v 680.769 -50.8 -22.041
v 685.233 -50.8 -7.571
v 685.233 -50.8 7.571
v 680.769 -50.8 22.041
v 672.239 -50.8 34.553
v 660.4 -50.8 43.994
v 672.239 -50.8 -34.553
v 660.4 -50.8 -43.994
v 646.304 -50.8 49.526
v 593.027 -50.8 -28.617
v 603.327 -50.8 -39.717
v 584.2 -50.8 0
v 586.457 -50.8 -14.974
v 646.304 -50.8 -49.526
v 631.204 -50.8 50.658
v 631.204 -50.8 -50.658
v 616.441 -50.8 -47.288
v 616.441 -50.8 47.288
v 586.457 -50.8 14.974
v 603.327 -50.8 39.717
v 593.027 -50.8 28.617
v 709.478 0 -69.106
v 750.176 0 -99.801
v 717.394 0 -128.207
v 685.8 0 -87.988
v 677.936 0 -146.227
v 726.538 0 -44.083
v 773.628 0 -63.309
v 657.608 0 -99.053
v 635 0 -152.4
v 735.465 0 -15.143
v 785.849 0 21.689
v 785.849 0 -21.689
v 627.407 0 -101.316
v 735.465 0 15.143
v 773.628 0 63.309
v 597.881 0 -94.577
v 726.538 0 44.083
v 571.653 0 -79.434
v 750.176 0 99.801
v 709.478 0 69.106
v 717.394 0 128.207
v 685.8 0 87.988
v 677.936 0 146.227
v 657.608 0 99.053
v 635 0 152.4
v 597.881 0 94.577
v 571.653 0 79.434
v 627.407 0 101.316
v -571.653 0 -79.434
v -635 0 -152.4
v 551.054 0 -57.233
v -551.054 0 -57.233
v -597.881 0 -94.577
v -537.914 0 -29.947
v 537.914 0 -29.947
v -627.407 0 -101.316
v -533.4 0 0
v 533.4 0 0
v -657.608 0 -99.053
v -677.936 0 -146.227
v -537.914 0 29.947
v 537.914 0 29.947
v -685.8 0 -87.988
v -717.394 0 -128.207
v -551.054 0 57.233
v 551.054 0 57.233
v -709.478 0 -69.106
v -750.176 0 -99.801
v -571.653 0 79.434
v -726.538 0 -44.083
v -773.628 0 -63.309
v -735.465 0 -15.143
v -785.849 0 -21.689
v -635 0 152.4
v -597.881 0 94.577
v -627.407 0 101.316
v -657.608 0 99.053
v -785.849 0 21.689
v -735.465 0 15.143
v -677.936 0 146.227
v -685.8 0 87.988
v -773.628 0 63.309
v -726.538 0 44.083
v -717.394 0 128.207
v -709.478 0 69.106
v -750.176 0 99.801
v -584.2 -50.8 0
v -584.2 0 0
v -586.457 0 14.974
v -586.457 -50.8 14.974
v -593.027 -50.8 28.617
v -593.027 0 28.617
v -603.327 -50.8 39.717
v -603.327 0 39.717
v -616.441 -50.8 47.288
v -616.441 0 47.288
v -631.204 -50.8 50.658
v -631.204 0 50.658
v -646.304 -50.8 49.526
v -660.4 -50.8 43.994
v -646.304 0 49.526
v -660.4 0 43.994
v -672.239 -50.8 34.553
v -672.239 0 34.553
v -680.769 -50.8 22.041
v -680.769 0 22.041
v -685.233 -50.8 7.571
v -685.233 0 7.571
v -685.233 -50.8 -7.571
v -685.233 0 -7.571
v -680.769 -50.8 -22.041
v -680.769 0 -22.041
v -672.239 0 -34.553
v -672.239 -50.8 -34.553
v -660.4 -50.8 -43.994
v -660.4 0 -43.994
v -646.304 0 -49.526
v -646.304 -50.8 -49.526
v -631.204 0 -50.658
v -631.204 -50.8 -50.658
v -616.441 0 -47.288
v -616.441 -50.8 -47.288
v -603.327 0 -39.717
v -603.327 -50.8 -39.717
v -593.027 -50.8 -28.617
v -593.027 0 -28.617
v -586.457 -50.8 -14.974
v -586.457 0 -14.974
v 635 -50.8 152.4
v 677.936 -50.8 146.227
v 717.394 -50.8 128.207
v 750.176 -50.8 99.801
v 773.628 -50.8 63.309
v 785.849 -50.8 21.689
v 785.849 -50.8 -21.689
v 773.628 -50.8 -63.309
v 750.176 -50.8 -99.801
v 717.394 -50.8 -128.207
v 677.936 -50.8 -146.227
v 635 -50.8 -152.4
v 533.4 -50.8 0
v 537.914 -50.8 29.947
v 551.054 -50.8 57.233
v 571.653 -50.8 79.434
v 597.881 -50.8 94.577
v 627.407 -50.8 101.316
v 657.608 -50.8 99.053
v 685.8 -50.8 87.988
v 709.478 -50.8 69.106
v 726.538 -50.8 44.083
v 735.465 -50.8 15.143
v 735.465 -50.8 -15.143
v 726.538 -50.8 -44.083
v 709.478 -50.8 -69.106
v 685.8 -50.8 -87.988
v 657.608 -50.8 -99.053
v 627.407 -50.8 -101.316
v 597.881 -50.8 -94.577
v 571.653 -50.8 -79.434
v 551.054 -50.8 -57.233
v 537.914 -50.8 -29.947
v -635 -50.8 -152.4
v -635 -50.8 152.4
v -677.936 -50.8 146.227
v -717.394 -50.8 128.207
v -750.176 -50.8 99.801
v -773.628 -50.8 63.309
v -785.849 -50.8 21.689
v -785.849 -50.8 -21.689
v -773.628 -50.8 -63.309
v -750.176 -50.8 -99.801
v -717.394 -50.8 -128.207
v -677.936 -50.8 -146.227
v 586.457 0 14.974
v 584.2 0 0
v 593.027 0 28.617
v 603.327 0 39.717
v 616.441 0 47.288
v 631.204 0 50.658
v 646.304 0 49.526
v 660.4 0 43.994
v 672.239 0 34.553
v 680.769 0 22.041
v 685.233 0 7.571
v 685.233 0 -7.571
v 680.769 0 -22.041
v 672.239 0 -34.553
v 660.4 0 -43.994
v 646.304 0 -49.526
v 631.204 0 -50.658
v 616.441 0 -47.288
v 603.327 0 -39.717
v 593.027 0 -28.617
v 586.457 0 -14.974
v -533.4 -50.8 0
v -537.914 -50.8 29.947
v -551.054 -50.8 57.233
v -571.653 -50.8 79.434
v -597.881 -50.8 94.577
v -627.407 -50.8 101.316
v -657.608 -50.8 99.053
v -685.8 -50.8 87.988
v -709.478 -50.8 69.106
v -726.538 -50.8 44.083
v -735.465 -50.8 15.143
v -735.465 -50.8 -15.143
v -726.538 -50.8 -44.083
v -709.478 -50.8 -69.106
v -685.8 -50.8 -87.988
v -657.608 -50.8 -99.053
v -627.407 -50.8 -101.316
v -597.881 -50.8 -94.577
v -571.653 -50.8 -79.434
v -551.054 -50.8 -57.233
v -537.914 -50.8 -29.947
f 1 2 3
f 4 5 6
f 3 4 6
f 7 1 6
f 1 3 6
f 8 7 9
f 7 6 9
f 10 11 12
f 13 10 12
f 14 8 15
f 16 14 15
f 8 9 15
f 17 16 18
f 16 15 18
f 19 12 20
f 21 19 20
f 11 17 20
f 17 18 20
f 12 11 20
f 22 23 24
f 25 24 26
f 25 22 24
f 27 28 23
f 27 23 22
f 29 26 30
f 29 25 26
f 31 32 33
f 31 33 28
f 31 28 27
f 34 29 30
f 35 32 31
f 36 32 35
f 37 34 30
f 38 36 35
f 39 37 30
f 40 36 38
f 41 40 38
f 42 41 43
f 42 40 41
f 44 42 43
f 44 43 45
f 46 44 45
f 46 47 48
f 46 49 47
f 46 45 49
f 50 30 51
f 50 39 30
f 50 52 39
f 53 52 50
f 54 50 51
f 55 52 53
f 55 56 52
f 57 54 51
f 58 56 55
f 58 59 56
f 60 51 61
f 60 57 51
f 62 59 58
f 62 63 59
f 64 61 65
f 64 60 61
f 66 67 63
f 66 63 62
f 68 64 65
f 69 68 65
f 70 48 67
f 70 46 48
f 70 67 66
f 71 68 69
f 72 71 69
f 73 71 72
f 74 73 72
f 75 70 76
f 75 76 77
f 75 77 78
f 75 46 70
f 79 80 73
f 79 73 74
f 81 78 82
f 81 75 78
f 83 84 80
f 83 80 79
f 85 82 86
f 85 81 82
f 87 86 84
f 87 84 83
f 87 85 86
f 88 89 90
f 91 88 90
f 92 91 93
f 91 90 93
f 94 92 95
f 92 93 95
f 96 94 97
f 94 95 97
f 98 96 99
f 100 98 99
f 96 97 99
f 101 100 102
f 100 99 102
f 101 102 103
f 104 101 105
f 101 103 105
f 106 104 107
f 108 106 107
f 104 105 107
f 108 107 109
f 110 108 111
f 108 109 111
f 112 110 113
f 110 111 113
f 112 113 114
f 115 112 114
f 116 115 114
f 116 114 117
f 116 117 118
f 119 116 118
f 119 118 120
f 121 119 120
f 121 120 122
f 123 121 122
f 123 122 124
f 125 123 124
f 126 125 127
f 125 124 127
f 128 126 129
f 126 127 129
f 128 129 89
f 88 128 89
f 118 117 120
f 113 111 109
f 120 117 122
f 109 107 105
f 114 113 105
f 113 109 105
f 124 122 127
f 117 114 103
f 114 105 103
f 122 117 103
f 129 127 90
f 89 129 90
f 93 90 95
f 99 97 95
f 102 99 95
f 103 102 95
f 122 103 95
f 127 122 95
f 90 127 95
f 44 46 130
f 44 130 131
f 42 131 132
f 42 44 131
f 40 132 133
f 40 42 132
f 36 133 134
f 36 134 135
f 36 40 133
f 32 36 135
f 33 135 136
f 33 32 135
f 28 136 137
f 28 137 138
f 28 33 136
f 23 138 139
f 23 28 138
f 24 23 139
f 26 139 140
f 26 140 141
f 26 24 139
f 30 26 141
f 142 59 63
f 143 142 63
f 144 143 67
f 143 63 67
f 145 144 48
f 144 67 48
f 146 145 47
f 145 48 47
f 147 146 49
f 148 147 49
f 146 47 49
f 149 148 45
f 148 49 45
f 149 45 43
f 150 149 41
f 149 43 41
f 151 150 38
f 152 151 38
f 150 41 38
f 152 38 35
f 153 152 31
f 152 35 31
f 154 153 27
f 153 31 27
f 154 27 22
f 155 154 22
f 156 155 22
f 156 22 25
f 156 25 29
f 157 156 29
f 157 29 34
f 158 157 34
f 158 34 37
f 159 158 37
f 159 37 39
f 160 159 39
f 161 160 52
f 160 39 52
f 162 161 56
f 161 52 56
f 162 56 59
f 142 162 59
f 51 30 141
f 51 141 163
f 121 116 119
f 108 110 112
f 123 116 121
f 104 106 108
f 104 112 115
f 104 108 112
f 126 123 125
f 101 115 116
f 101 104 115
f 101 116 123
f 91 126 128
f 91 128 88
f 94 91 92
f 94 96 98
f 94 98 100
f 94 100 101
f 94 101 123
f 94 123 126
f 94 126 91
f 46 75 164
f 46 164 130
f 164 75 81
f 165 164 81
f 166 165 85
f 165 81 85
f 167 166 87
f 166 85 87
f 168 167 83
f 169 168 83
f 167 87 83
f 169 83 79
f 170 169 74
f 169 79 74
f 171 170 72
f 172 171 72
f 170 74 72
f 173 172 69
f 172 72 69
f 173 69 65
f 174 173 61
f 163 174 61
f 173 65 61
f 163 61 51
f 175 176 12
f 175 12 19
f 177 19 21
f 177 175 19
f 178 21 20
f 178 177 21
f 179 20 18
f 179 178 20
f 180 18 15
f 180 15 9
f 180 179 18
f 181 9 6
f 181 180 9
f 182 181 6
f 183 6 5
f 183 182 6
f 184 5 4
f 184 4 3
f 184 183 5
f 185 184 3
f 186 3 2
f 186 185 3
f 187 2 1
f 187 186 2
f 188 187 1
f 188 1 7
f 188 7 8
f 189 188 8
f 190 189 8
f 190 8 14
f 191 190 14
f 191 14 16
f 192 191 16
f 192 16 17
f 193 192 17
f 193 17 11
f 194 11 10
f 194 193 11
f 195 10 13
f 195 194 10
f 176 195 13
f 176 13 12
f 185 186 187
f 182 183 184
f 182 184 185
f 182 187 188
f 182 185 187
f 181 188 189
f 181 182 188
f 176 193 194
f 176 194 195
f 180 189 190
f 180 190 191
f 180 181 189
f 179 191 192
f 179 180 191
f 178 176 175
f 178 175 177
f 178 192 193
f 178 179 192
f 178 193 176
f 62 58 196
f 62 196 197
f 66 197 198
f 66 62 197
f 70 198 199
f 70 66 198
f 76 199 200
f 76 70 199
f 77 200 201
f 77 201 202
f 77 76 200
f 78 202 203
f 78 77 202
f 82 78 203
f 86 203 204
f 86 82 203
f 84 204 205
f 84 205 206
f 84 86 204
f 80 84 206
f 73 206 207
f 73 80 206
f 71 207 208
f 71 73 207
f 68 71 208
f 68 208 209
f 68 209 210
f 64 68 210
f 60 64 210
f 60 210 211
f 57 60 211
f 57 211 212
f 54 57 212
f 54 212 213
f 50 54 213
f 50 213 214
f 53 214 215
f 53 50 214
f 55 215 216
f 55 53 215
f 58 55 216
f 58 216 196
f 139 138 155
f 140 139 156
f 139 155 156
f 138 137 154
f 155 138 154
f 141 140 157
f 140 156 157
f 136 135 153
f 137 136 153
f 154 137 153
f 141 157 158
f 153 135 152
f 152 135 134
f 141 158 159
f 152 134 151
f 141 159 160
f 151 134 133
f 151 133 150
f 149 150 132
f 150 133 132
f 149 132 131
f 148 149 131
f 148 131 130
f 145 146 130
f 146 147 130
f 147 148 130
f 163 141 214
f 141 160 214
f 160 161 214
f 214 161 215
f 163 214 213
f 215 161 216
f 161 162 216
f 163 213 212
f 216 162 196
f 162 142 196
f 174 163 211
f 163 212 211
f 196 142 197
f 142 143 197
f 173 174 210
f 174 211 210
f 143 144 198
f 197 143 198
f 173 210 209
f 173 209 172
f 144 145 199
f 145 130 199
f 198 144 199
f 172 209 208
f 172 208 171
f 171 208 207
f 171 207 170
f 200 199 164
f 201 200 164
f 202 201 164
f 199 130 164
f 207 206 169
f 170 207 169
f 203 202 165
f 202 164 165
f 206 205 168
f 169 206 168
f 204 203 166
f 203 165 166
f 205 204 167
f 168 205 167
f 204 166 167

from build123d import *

# Parameters (mm, degrees)
F0_R     = 50.8
F1_DEPTH = 50.8
F0_R_2   = 101.6


with BuildPart() as f1:
    # F0 (on Front) → F1 (new body)
    with BuildSketch(Plane.XZ):
        with Locations((-635, 0)):
            Circle(F0_R)
    extrude(amount=F1_DEPTH)


with BuildPart() as f1b:
    # F0 (on Front) → F1, piece 2 (new body)
    with BuildSketch(Plane.XZ):
        with BuildLine():
            ThreePointArc((-635, 152.4), (-527.2369265472, 107.7630734528), (-482.6, 0))
            ThreePointArc((-482.6, 0), (-527.2369265472, -107.7630734528), (-635, -152.4))
            Line((-635, -152.4), (0, -152.4))
            Line((0, -152.4), (0, 152.4))
            Line((0, 152.4), (-635, 152.4))
        make_face()
        with BuildLine():
            ThreePointArc((-635, -152.4), (-527.2369265472, -107.7630734528), (-482.6, 0))
            ThreePointArc((-482.6, 0), (-527.2369265472, 107.7630734528), (-635, 152.4))
            ThreePointArc((-635, 152.4), (-787.4, 0), (-635, -152.4))
        make_face()
        with Locations((-635, 0)):
            Circle(F0_R_2, mode=Mode.SUBTRACT)
    extrude(amount=F1_DEPTH)

    # F2: F1b, F1 across face


with BuildPart() as f1b_1:
    add(f1b.part)
    add(f1b.part.mirror(Plane(origin=(0, -25.4, 0), x_dir=(0, 1, 0), z_dir=(1, 0, 0))))
    add(f1.part.mirror(Plane(origin=(0, -25.4, 0), x_dir=(0, 1, 0), z_dir=(1, 0, 0))))


solid = Compound([f1.part, f1b_1.part])
